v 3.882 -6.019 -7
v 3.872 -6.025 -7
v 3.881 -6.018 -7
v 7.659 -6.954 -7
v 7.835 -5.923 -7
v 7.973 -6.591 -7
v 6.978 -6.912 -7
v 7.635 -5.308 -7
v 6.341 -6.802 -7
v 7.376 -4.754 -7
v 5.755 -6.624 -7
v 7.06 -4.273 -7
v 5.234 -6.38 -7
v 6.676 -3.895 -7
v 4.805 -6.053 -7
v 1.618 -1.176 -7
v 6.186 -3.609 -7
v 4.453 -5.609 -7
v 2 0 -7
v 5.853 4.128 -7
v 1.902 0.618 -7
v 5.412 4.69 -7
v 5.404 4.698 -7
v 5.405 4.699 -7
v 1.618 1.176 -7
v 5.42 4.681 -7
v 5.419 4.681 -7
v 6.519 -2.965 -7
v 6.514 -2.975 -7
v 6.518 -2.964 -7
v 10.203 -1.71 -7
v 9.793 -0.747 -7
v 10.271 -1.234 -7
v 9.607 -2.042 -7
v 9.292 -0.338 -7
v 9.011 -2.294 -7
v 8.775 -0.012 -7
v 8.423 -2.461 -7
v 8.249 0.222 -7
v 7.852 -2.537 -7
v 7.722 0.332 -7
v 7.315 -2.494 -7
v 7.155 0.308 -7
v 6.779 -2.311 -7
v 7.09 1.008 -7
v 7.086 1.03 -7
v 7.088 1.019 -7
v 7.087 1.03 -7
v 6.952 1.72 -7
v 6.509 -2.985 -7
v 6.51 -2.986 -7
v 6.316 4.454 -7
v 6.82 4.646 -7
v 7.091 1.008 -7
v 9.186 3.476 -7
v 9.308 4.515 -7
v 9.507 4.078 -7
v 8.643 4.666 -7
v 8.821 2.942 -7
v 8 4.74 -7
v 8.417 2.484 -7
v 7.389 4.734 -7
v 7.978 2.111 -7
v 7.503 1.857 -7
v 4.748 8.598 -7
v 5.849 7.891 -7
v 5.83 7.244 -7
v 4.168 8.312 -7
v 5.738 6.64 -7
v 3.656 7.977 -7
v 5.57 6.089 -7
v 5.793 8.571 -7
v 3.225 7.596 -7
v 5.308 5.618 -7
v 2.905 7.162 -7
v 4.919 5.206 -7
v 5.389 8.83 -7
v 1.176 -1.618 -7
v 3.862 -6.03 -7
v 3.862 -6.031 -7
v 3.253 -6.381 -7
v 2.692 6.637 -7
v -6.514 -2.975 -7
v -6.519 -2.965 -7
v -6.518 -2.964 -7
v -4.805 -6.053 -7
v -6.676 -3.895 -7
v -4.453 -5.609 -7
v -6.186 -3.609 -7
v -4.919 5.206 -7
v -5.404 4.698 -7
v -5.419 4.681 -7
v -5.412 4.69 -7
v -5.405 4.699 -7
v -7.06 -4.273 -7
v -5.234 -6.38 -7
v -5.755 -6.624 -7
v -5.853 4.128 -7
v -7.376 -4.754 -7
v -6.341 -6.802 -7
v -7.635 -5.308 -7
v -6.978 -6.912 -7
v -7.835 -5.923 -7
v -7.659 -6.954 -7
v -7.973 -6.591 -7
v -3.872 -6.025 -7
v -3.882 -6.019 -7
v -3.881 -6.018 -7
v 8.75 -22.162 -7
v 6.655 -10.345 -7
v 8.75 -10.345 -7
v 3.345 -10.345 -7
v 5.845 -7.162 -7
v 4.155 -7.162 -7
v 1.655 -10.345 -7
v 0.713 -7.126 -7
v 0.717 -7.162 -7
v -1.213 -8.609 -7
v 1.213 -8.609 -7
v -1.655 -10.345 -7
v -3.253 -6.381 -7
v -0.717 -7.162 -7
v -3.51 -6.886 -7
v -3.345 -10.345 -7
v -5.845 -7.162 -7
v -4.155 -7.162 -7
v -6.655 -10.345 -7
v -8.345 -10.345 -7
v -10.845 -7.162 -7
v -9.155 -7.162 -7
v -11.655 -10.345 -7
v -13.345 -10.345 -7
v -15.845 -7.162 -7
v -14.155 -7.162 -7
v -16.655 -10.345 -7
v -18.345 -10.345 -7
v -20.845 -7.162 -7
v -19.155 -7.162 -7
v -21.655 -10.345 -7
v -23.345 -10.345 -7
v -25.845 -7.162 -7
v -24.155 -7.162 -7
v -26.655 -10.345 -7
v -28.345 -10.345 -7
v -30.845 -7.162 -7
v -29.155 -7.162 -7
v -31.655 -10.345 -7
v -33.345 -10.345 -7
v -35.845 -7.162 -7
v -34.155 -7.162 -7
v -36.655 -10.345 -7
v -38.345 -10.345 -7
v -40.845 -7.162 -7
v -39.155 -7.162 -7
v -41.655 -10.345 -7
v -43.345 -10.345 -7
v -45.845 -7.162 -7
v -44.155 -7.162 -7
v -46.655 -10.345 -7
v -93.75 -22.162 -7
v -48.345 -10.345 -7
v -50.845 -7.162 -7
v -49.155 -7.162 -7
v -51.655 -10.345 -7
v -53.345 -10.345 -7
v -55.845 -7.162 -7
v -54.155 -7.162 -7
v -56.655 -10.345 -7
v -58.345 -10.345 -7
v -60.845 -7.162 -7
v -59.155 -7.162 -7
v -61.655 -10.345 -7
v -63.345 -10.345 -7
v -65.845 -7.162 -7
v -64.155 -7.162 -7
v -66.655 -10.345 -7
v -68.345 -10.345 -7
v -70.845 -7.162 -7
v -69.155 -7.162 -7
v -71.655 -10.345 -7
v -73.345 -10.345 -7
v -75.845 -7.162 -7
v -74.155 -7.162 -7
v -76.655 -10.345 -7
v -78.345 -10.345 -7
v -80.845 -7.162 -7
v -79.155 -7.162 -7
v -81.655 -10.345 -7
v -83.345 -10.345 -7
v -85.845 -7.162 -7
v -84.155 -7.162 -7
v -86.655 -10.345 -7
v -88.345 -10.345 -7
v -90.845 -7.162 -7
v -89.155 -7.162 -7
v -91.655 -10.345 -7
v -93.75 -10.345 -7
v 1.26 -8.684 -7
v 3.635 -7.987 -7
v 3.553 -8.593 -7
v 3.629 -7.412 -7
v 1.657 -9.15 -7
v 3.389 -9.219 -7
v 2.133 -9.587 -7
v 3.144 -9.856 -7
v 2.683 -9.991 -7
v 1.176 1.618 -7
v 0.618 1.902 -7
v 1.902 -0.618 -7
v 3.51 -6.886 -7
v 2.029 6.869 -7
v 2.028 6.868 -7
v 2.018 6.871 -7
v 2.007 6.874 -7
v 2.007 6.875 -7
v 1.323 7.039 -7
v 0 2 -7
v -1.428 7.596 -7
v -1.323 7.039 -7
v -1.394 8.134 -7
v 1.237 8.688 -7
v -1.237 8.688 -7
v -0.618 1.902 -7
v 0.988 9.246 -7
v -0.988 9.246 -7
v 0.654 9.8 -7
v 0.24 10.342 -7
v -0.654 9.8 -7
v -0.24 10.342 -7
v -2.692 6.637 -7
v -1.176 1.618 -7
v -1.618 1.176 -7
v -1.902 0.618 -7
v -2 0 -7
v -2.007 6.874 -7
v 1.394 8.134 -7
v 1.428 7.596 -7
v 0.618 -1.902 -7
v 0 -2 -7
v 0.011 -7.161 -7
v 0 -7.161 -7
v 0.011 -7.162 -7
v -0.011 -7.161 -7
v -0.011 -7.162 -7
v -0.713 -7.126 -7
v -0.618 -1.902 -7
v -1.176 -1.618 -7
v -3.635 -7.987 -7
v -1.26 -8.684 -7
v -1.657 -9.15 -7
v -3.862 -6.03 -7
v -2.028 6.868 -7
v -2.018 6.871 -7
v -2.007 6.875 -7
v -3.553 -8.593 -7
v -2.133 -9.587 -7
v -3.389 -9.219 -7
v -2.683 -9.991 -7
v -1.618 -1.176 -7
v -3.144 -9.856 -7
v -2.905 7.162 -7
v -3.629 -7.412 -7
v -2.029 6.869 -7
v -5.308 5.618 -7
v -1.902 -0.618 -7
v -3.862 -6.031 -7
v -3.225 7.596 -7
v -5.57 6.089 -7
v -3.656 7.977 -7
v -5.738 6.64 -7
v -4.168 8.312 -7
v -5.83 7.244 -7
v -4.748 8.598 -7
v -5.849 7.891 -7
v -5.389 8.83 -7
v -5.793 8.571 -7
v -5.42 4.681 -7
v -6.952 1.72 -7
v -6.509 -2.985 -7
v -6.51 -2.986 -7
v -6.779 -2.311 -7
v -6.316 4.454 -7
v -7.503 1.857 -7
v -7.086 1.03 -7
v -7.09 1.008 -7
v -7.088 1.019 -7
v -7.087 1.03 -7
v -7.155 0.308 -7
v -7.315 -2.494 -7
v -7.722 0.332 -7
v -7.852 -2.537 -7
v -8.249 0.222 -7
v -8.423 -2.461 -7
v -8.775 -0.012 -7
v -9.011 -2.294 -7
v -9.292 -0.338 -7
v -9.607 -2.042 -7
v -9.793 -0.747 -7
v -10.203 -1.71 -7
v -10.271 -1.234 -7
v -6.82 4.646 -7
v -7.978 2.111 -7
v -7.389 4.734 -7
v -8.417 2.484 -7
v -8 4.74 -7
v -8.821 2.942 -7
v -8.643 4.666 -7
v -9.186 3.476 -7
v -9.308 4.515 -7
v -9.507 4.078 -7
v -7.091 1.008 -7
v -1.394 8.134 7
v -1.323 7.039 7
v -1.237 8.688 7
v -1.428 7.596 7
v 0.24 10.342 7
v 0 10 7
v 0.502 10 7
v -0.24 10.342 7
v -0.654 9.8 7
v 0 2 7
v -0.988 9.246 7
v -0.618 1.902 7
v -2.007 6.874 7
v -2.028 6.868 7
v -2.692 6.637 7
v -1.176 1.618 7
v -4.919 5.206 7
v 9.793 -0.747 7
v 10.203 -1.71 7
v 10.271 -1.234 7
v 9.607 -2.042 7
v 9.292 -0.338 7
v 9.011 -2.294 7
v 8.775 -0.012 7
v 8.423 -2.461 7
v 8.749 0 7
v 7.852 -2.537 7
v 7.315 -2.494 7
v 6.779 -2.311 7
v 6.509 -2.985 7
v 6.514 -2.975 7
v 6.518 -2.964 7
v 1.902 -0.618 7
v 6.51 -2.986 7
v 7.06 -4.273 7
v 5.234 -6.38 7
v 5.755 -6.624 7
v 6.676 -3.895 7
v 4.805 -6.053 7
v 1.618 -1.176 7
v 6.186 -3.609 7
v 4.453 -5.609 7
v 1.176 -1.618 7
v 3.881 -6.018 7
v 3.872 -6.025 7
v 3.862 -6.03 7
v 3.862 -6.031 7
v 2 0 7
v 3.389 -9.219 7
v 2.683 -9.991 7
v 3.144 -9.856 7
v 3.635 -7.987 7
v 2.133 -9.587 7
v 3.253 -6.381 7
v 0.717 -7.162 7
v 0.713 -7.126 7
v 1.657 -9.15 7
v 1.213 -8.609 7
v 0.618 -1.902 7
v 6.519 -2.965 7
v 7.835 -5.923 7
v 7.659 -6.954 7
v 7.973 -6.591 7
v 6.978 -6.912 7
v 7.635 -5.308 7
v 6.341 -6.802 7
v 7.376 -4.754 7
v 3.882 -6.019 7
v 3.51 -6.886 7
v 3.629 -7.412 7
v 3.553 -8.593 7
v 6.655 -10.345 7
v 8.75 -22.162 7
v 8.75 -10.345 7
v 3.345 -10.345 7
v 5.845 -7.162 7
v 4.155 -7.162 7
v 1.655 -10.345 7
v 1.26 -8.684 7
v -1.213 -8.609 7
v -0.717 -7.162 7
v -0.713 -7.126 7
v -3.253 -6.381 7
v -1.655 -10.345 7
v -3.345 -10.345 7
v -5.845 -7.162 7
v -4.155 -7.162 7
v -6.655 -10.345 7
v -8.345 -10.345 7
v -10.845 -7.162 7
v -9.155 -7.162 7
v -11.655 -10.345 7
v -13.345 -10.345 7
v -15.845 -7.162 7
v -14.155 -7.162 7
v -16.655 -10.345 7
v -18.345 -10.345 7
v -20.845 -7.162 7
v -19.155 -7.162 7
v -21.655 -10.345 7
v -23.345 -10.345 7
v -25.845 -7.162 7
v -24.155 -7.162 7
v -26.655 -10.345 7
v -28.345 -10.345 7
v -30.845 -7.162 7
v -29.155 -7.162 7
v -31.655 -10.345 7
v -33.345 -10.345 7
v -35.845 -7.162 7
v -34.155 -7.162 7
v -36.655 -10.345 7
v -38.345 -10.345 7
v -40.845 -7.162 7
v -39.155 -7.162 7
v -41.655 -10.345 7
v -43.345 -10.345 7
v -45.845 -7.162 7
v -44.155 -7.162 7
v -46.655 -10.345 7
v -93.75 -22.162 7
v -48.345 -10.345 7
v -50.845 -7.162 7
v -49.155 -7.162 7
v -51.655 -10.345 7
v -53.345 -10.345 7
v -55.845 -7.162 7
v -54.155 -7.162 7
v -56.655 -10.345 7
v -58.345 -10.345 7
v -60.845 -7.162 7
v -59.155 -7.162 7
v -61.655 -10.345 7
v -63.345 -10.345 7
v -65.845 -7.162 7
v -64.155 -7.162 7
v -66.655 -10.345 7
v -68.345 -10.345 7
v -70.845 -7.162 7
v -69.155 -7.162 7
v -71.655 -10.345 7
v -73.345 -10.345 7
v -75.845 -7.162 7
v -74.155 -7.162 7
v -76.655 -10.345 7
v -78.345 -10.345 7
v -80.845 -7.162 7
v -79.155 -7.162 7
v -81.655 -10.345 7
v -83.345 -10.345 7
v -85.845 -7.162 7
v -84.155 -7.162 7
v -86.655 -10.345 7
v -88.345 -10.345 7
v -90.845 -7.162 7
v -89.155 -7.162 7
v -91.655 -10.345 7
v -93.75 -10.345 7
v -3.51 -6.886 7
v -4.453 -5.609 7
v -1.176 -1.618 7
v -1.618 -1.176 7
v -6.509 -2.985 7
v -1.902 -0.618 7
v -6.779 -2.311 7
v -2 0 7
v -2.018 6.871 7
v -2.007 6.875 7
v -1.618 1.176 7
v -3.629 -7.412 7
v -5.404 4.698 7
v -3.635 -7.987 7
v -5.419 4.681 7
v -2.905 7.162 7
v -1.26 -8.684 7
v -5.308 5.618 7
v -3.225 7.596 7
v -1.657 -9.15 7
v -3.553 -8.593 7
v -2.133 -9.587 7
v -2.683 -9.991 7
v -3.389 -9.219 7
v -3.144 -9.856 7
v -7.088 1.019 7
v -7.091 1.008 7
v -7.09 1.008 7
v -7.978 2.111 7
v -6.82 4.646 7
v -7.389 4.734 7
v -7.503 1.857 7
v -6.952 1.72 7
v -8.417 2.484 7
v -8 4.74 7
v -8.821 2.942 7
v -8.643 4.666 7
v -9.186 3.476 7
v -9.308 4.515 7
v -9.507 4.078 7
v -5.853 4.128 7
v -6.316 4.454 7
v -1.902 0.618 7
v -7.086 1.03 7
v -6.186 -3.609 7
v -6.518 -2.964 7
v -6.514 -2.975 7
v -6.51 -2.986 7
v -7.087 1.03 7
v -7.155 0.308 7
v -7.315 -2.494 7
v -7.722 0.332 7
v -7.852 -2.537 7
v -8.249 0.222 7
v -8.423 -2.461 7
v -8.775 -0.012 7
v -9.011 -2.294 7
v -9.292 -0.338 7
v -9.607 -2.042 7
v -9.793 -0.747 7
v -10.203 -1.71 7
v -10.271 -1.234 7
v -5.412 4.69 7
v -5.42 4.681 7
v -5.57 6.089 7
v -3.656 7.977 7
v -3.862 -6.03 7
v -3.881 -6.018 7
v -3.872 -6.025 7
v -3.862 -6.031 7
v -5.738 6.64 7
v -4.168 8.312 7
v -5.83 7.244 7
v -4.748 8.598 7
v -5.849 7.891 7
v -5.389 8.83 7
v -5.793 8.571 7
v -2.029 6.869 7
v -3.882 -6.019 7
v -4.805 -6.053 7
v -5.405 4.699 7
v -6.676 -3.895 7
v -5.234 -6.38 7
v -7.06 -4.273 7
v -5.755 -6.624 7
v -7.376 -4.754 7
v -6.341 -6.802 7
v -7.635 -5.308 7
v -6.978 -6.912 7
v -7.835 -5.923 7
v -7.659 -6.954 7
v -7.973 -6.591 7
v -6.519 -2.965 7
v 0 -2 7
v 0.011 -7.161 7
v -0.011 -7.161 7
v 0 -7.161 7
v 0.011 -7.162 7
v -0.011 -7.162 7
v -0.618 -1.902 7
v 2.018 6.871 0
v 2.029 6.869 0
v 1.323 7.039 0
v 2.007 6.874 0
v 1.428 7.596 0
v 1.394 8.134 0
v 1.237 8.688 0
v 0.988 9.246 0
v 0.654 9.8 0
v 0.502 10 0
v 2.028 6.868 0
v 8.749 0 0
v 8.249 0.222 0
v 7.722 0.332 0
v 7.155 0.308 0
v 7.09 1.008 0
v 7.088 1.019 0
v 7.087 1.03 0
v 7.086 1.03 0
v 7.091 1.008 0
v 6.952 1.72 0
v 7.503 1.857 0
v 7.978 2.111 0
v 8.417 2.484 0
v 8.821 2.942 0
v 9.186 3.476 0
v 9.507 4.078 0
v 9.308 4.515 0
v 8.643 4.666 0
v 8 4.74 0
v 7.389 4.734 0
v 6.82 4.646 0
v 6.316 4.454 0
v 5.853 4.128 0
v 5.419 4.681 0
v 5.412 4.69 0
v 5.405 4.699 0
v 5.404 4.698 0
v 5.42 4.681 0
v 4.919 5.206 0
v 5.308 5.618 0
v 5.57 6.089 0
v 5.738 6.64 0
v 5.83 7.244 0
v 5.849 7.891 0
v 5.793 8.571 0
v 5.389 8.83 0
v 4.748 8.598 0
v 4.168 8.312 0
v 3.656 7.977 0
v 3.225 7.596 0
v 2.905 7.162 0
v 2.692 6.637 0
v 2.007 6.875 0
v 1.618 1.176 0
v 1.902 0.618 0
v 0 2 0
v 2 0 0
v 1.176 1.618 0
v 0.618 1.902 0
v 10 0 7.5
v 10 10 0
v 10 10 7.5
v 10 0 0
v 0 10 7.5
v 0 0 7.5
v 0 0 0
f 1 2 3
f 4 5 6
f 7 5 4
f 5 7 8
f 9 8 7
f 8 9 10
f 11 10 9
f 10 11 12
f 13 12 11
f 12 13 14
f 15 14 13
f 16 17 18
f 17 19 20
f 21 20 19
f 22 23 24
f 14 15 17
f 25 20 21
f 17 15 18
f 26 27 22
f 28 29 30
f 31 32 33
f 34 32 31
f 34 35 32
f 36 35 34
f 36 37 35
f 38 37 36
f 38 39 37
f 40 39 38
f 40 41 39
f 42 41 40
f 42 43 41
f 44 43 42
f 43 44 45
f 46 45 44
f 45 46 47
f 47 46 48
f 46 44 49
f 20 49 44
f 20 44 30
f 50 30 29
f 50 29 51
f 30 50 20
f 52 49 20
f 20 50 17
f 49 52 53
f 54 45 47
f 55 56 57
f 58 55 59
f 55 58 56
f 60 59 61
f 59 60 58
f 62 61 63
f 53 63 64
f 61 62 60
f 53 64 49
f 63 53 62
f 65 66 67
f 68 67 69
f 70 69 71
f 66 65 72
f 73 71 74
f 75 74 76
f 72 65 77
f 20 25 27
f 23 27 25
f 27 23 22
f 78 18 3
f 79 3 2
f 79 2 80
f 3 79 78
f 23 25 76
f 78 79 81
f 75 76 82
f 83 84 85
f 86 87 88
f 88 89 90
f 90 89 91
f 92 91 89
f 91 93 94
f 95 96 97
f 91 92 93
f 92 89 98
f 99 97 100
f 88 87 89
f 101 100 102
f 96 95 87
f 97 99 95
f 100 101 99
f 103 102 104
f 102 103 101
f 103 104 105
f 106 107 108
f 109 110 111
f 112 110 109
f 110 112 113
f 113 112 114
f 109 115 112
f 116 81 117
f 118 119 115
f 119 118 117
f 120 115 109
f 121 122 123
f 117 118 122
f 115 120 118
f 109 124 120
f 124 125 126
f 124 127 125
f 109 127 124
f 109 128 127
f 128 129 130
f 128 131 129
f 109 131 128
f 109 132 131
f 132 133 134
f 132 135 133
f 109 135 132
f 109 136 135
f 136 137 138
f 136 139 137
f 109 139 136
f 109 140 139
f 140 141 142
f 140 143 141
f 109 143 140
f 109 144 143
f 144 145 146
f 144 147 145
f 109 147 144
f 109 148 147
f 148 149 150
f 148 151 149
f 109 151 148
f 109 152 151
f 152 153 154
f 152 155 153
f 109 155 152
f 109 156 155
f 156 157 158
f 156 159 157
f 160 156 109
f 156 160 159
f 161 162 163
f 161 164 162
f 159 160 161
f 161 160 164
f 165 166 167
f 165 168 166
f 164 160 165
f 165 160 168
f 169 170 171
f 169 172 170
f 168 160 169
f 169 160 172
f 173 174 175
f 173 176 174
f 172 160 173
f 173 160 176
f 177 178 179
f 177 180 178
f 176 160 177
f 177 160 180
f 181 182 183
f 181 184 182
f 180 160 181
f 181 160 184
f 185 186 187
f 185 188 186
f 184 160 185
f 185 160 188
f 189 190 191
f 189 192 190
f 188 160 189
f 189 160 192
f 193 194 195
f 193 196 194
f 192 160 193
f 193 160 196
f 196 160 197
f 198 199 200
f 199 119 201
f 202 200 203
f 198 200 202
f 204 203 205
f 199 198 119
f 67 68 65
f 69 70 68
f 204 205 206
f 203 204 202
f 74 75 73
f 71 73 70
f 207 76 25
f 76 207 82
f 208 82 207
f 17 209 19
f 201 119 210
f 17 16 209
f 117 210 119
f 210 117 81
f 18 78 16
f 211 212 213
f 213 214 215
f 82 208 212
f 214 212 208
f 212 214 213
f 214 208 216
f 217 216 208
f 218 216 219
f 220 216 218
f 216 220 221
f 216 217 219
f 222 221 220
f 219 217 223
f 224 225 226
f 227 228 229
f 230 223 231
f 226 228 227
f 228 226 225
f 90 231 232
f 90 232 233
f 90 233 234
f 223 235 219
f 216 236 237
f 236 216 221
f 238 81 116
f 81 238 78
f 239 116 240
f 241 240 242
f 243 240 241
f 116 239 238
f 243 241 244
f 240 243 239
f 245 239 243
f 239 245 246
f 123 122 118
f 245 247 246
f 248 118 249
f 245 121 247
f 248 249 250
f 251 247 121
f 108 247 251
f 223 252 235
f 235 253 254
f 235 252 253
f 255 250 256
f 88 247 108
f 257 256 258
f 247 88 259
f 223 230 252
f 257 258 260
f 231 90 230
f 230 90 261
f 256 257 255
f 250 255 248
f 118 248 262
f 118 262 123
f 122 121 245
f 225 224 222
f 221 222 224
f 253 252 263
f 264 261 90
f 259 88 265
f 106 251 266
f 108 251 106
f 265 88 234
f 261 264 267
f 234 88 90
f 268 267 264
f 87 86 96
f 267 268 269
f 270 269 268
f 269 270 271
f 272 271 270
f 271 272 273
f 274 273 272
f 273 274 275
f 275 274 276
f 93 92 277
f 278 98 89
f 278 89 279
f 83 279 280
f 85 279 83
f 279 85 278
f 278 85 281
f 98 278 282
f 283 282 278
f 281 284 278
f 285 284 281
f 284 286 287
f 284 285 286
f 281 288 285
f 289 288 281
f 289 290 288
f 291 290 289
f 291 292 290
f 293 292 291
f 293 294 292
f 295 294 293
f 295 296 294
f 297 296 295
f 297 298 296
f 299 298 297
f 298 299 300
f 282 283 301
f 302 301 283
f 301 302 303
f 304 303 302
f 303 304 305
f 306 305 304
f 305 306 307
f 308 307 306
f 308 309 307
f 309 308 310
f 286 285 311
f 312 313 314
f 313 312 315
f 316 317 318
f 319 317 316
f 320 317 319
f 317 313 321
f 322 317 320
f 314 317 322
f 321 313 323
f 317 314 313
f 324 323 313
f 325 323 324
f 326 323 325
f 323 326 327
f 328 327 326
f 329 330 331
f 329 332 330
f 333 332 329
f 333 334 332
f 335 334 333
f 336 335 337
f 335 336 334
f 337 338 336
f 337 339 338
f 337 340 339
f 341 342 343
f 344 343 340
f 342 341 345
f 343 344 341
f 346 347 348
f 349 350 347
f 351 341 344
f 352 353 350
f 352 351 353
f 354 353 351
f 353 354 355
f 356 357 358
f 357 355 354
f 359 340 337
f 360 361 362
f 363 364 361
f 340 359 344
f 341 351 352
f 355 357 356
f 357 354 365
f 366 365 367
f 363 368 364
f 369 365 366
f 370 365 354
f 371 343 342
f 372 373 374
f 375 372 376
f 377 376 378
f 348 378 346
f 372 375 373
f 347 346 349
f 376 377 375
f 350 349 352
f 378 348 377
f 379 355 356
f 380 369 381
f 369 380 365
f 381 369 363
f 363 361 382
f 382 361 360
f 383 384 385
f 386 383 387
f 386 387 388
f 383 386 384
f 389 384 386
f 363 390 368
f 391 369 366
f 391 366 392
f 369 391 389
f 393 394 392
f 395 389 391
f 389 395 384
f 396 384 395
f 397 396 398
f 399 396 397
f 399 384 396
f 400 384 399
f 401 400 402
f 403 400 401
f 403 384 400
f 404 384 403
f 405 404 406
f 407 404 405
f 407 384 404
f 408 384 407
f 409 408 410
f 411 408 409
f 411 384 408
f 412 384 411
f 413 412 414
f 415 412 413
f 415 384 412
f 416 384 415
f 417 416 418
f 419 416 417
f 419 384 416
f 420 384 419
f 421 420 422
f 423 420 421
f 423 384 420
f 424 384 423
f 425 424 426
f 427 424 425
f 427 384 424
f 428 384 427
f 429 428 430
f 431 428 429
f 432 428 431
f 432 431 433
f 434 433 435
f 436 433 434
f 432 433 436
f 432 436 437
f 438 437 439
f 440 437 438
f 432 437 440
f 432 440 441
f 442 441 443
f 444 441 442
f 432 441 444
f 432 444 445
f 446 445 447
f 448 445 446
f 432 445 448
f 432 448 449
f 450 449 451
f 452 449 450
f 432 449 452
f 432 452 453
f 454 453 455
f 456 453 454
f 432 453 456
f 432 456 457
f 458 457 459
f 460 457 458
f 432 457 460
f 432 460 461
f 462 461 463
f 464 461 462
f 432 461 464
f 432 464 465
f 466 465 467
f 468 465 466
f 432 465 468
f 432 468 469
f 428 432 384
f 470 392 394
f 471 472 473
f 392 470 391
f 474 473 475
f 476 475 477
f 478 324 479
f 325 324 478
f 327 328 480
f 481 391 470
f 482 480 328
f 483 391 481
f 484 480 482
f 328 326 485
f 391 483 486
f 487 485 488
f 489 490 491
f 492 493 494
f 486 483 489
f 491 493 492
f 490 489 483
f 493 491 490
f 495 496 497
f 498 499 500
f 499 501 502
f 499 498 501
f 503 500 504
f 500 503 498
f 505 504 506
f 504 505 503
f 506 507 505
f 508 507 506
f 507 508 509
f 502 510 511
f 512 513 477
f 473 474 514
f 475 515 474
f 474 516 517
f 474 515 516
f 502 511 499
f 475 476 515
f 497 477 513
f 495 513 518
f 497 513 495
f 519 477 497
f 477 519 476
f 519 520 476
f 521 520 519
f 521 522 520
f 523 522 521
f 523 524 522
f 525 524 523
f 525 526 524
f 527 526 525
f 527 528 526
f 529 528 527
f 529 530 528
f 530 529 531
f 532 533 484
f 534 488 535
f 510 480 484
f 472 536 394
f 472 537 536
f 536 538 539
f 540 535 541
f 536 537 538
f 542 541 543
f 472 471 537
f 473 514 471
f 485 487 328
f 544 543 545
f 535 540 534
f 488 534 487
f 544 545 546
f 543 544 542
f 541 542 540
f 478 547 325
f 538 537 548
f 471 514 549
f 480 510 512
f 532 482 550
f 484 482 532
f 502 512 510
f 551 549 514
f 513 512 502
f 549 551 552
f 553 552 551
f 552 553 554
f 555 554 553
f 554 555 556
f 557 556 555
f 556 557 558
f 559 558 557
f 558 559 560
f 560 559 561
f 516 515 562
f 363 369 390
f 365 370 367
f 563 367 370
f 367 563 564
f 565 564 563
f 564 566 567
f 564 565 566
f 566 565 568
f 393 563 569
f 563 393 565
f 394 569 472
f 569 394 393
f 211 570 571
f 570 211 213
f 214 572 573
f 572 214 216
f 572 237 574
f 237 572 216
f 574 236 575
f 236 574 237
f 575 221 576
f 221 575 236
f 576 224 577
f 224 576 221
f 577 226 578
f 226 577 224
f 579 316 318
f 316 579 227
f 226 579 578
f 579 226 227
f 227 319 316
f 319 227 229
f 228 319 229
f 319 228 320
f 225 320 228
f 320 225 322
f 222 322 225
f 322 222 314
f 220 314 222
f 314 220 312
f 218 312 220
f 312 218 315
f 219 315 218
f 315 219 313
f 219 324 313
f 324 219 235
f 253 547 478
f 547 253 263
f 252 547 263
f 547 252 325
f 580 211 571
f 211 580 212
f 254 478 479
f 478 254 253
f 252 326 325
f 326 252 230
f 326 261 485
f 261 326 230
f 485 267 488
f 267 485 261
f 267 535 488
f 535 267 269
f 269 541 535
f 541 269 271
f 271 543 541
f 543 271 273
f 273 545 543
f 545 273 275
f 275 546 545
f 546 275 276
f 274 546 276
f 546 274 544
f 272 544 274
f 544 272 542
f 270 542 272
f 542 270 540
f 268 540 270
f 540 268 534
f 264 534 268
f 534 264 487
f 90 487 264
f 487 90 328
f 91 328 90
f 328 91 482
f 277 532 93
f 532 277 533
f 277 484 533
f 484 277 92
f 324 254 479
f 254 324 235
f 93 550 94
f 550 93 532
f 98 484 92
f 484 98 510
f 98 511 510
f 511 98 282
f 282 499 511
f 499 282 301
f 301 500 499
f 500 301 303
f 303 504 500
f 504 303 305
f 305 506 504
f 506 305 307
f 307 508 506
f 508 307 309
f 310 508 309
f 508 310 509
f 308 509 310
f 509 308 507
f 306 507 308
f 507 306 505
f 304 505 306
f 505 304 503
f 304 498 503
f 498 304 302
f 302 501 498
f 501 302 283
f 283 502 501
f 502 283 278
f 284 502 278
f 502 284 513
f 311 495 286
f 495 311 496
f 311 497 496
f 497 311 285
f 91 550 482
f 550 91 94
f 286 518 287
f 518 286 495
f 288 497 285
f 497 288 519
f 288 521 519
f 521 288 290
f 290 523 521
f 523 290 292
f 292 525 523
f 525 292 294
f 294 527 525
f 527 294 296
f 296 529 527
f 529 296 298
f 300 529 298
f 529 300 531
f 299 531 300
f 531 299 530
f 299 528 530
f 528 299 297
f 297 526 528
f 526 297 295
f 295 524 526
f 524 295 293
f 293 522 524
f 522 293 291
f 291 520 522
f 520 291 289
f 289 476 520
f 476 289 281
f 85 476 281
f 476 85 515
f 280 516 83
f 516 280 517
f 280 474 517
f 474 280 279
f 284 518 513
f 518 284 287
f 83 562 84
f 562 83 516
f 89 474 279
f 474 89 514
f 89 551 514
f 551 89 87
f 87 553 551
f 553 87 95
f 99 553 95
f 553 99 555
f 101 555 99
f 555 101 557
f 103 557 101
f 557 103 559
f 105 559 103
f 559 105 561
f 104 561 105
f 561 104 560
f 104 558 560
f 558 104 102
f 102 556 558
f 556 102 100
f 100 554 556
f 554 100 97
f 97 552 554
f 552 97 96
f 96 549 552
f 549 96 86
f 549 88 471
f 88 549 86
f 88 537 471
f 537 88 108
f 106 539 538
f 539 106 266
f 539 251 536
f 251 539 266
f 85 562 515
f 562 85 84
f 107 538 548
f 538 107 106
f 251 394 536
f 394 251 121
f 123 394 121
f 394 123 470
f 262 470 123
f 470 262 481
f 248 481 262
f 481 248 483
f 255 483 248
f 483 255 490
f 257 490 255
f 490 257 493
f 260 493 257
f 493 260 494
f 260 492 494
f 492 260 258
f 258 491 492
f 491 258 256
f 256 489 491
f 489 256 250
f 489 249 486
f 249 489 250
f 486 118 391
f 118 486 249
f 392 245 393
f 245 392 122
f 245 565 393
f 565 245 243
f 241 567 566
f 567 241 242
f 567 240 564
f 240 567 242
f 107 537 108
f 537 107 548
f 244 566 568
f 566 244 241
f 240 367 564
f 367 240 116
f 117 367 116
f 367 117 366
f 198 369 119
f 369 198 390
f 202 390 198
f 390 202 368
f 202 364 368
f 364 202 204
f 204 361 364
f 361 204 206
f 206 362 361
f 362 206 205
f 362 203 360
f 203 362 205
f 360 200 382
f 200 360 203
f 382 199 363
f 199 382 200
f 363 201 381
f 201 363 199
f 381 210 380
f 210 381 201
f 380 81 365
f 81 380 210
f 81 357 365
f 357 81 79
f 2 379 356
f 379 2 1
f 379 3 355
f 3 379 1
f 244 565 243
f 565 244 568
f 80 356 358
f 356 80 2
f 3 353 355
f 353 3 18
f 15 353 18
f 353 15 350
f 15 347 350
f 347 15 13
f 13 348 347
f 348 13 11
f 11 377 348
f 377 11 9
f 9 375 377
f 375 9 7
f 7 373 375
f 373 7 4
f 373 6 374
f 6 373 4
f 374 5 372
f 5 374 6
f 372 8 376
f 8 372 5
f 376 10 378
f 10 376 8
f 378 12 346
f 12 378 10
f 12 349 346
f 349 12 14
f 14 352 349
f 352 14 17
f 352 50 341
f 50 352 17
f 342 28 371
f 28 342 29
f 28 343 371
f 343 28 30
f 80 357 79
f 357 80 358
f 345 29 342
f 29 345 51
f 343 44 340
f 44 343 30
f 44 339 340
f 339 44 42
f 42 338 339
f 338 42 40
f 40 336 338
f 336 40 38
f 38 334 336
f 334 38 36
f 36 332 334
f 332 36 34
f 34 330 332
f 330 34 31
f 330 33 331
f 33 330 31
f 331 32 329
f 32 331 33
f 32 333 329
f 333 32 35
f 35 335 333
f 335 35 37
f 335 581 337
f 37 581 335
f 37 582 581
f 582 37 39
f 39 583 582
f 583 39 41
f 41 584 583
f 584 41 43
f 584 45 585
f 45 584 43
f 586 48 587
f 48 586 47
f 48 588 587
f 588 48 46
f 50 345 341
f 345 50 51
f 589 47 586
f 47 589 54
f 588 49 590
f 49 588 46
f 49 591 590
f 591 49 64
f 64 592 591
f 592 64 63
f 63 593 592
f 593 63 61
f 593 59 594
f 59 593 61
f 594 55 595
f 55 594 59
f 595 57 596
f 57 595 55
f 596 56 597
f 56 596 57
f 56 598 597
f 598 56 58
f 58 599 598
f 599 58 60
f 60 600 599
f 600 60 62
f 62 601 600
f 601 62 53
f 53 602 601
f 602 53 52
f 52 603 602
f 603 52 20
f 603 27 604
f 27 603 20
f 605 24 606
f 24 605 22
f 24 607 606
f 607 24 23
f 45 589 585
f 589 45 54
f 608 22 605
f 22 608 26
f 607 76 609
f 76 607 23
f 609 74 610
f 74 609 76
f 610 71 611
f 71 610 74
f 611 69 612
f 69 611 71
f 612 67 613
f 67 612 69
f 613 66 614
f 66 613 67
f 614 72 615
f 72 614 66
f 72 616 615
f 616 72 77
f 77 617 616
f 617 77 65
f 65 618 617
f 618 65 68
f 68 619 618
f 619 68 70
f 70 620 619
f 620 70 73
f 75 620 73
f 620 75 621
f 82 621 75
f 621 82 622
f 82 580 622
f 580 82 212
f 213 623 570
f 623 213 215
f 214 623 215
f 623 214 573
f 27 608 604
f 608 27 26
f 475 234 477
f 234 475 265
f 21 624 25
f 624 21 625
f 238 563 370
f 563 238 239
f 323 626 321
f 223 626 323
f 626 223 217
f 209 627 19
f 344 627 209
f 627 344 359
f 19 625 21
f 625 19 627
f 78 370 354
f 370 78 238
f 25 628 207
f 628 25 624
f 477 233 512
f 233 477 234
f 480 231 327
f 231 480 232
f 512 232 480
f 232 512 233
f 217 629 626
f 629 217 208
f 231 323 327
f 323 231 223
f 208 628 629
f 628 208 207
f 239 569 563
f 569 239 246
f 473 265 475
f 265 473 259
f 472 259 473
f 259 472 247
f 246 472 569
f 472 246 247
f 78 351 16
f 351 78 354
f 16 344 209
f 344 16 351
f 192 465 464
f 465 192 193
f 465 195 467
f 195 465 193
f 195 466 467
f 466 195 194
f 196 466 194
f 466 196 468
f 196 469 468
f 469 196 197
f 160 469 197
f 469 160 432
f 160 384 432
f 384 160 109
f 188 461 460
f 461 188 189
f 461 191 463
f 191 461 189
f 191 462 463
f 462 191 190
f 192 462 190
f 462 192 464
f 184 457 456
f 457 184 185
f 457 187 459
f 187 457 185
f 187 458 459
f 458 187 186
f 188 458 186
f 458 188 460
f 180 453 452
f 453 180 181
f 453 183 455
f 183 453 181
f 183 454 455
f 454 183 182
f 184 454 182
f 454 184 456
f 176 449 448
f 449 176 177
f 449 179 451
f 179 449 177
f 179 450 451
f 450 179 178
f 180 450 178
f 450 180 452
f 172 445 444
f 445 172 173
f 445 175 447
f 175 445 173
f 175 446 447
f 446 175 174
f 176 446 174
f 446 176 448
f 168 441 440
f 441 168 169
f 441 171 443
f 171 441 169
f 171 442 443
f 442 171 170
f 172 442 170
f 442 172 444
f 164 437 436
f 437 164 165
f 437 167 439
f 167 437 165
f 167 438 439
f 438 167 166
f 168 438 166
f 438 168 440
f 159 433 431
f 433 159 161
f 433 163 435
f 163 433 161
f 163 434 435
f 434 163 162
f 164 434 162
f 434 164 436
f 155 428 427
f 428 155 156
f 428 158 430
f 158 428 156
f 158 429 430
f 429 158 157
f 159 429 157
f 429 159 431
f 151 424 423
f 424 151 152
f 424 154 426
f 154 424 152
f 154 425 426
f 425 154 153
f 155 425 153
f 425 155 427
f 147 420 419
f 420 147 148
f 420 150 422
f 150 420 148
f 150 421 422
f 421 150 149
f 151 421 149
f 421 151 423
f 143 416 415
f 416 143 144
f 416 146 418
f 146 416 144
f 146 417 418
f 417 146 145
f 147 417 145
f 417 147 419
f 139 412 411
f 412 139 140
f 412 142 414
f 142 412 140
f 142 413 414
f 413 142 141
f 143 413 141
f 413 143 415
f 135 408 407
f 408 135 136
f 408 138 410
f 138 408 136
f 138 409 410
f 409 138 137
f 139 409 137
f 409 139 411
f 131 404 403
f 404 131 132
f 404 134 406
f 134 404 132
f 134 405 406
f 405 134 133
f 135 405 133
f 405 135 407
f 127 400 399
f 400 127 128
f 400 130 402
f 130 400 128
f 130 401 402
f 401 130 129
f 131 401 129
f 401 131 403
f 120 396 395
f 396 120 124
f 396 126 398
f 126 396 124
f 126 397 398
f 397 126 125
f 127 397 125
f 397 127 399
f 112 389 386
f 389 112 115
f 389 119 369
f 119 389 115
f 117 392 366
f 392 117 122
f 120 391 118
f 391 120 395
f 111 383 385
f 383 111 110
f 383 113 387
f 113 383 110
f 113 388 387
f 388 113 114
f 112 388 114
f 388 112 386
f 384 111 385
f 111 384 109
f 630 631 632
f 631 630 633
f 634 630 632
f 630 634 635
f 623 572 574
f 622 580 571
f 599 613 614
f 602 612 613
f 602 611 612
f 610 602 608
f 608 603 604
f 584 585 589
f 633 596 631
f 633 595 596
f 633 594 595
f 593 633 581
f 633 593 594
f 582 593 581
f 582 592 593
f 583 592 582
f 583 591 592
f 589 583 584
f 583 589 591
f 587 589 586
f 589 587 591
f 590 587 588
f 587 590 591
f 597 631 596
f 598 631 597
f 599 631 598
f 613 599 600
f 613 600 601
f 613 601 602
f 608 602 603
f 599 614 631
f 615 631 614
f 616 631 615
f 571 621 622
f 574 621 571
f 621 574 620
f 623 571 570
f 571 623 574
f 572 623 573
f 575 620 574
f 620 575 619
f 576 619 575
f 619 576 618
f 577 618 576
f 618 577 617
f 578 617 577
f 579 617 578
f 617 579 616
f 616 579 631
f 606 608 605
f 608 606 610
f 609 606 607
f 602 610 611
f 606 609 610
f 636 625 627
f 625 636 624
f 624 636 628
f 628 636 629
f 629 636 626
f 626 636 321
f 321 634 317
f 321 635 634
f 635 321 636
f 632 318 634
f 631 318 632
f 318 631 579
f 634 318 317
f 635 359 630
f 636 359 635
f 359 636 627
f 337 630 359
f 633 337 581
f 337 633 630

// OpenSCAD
//////////////////////////////////////////////////////////////////////////////////////////////
// Public Domain Parametric Involute Spur Gear (and involute helical gear and involute rack)
// version 1.1
// by Leemon Baird, 2011, Leemon@Leemon.com
//http://www.thingiverse.com/thing:5505
//
// This file is public domain.  Use it for any purpose, including commercial
// applications.  Attribution would be nice, but is not required.  There is
// no warranty of any kind, including its correctness, usefulness, or safety.
// 
// This is parameterized involute spur (or helical) gear.  It is much simpler and less powerful than
// others on Thingiverse.  But it is public domain.  I implemented it from scratch from the 
// descriptions and equations on Wikipedia and the web, using Mathematica for calculations and testing,
// and I now release it into the public domain.
//
//		http://en.wikipedia.org/wiki/Involute_gear
//		http://en.wikipedia.org/wiki/Gear
//		http://en.wikipedia.org/wiki/List_of_gear_nomenclature
//		http://gtrebaol.free.fr/doc/catia/spur_gear.html
//		http://www.cs.cmu.edu/~rapidproto/mechanisms/chpt7.html
//
// The module gear() gives an involute spur gear, with reasonable defaults for all the parameters.
// Normally, you should just choose the first 4 parameters, and let the rest be default values.
// The module gear() gives a gear in the XY plane, centered on the origin, with one tooth centered on
// the positive Y axis.  The various functions below it take the same parameters, and return various
// measurements for the gear.  The most important is pitch_radius, which tells how far apart to space
// gears that are meshing, and adendum_radius, which gives the size of the region filled by the gear.
// A gear has a "pitch circle", which is an invisible circle that cuts through the middle of each
// tooth (though not the exact center). In order for two gears to mesh, their pitch circles should 
// just touch.  So the distance between their centers should be pitch_radius() for one, plus pitch_radius() 
// for the other, which gives the radii of their pitch circles.
//
// In order for two gears to mesh, they must have the same mm_per_tooth and pressure_angle parameters.  
// mm_per_tooth gives the number of millimeters of arc around the pitch circle covered by one tooth and one
// space between teeth.  The pitch angle controls how flat or bulged the sides of the teeth are.  Common
// values include 14.5 degrees and 20 degrees, and occasionally 25.  Though I've seen 28 recommended for
// plastic gears. Larger numbers bulge out more, giving stronger teeth, so 28 degrees is the default here.
//
// The ratio of number_of_teeth for two meshing gears gives how many times one will make a full 
// revolution when the the other makes one full revolution.  If the two numbers are coprime (i.e. 
// are not both divisible by the same number greater than 1), then every tooth on one gear
// will meet every tooth on the other, for more even wear.  So coprime numbers of teeth are good.
//
// The module rack() gives a rack, which is a bar with teeth.  A rack can mesh with any
// gear that has the same mm_per_tooth and pressure_angle.
//
// Some terminology: 
// The outline of a gear is a smooth circle (the "pitch circle") which has mountains and valleys
// added so it is toothed.  So there is an inner circle (the "root circle") that touches the 
// base of all the teeth, an outer circle that touches the tips of all the teeth,
// and the invisible pitch circle in between them.  There is also a "base circle", which can be smaller than
// all three of the others, which controls the shape of the teeth.  The side of each tooth lies on the path 
// that the end of a string would follow if it were wrapped tightly around the base circle, then slowly unwound.  
// That shape is an "involute", which gives this type of gear its name.
//
//////////////////////////////////////////////////////////////////////////////////////////////

//An involute spur gear, with reasonable defaults for all the parameters.
//Normally, you should just choose the first 4 parameters, and let the rest be default values.
//Meshing gears must match in mm_per_tooth, pressure_angle, and twist,
//and be separated by the sum of their pitch radii, which can be found with pitch_radius().
module gear (
	mm_per_tooth    = 3,    //this is the "circular pitch", the circumference of the pitch circle divided by the number of teeth
	number_of_teeth = 11,   //total number of teeth around the entire perimeter
	thickness       = 6,    //thickness of gear in mm
	hole_diameter   = 3,    //diameter of the hole in the center, in mm
	twist           = 0,    //teeth rotate this many degrees from bottom of gear to top.  360 makes the gear a screw with each thread going around once
	teeth_to_hide   = 0,    //number of teeth to delete to make this only a fraction of a circle
	pressure_angle  = 28,   //Controls how straight or bulged the tooth sides are. In degrees.
	clearance       = 0.0,  //gap between top of a tooth on one gear and bottom of valley on a meshing gear (in millimeters)
	backlash        = 0.0   //gap between two meshing teeth, in the direction along the circumference of the pitch circle
) {
	assign(pi = 3.1415926)
	assign(p  = mm_per_tooth * number_of_teeth / pi / 2)  //radius of pitch circle
	assign(c  = p + mm_per_tooth / pi - clearance)        //radius of outer circle
	assign(b  = p*cos(pressure_angle))                    //radius of base circle
	assign(r  = p-(c-p)-clearance)                        //radius of root circle
	assign(t  = mm_per_tooth/2-backlash/2)                //tooth thickness at pitch circle
	assign(k  = -iang(b, p) - t/2/p/pi*180) {             //angle to where involute meets base circle on each side of tooth
		difference() {
			for (i = [0:number_of_teeth-teeth_to_hide-1] )
				rotate([0,0,i*360/number_of_teeth])
					linear_extrude(height = thickness, center = true, convexity = 10, twist = twist)
						polygon(
							points=[
								[0, -hole_diameter/10],
								polar(r, -181/number_of_teeth),
								polar(r, r<b ? k : -180/number_of_teeth),
								q7(0/5,r,b,c,k, 1),q7(1/5,r,b,c,k, 1),q7(2/5,r,b,c,k, 1),q7(3/5,r,b,c,k, 1),q7(4/5,r,b,c,k, 1),q7(5/5,r,b,c,k, 1),
								q7(5/5,r,b,c,k,-1),q7(4/5,r,b,c,k,-1),q7(3/5,r,b,c,k,-1),q7(2/5,r,b,c,k,-1),q7(1/5,r,b,c,k,-1),q7(0/5,r,b,c,k,-1),
								polar(r, r<b ? -k : 180/number_of_teeth),
								polar(r, 181/number_of_teeth)
							],
 							paths=[[0,1,2,3,4,5,6,7,8,9,10,11,12,13,14,15,16]]
						);
			cylinder(h=2*thickness+1, r=hole_diameter/2, center=true, $fn=20);
		}
	}
};	
//these 4 functions are used by gear
function polar(r,theta)   = r*[sin(theta), cos(theta)];                            //convert polar to cartesian coordinates
function iang(r1,r2)      = sqrt((r2/r1)*(r2/r1) - 1)/3.1415926*180 - acos(r1/r2); //unwind a string this many degrees to go from radius r1 to radius r2
function q7(f,r,b,r2,t,s) = q6(b,s,t,(1-f)*max(b,r)+f*r2);                         //radius a fraction f up the curved side of the tooth 
function q6(b,s,t,d)      = polar(d,s*(iang(b,d)+t));                              //point at radius d on the involute curve

//a rack, which is a straight line with teeth (the same as a segment from a giant gear with a huge number of teeth).
//The "pitch circle" is a line along the X axis.
module rack (
	mm_per_tooth    = 3,    //this is the "circular pitch", the circumference of the pitch circle divided by the number of teeth
	number_of_teeth = 11,   //total number of teeth along the rack
	thickness       = 6,    //thickness of rack in mm (affects each tooth)
	height          = 120,   //height of rack in mm, from tooth top to far side of rack.
	pressure_angle  = 28,   //Controls how straight or bulged the tooth sides are. In degrees.
	backlash        = 0.0   //gap between two meshing teeth, in the direction along the circumference of the pitch circle
) {
	assign(pi = 3.1415926)
	assign(a = mm_per_tooth / pi) //addendum
	assign(t = a*cos(pressure_angle)-1)         //tooth side is tilted so top/bottom corners move this amount
		for (i = [0:number_of_teeth-1] )
			translate([i*mm_per_tooth,0,0])
				linear_extrude(height = thickness, center = true, convexity = 10)
					polygon(
						points=[
							[-mm_per_tooth * 3/4,                 a-height],
							[-mm_per_tooth * 3/4 - backlash,     -a],
							[-mm_per_tooth * 1/4 + backlash - t, -a],
							[-mm_per_tooth * 1/4 + backlash + t,  a],
							[ mm_per_tooth * 1/4 - backlash - t,  a],
							[ mm_per_tooth * 1/4 - backlash + t, -a],
							[ mm_per_tooth * 3/4 + backlash,     -a],
							[ mm_per_tooth * 3/4,                 a-height],
						],
						paths=[[0,1,2,3,4,5,6,7]]
					);
};	

//These 5 functions let the user find the derived dimensions of the gear.
//A gear fits within a circle of radius outer_radius, and two gears should have
//their centers separated by the sum of their pictch_radius.
function circular_pitch  (mm_per_tooth=3) = mm_per_tooth;                     //tooth density expressed as "circular pitch" in millimeters
function diametral_pitch (mm_per_tooth=3) = 3.1415926 / mm_per_tooth;         //tooth density expressed as "diametral pitch" in teeth per millimeter
function module_value    (mm_per_tooth=3) = mm_per_tooth / pi;                //tooth density expressed as "module" or "modulus" in millimeters
function pitch_radius    (mm_per_tooth=3,number_of_teeth=11) = mm_per_tooth * number_of_teeth / 3.1415926 / 2;
function outer_radius    (mm_per_tooth=3,number_of_teeth=11,clearance=0.1)    //The gear fits entirely within a cylinder of this radius.
	= mm_per_tooth*(1+number_of_teeth/2)/3.1415926  - clearance;              

//////////////////////////////////////////////////////////////////////////////////////////////
//example gear train.  
//Try it with OpenSCAD View/Animate command with 20 steps and 24 FPS.
//The gears will continue to be rotated to mesh correctly if you change the number of teeth.

n1 = 11; //red gear number of teeth
n2 = 20; //green gear
n3 = 5;  //blue gear
n4 = 20; //orange gear
n5 = 20;  //gray rack
mm_per_tooth = 5; //all meshing gears need the same mm_per_tooth (and the same pressure_angle)
thickness    = 14;
hole         = 4;
height       = 15;

d1 =pitch_radius(mm_per_tooth,n1);
d12=pitch_radius(mm_per_tooth,n1) + pitch_radius(mm_per_tooth,n2);
d13=pitch_radius(mm_per_tooth,n1) + pitch_radius(mm_per_tooth,n3);
d14=pitch_radius(mm_per_tooth,n1) + pitch_radius(mm_per_tooth,n4);

translate([0,0,0]) rotate([0,0, $t*360/n1])color([1.00,0.75,0.75])
gear(mm_per_tooth,n1,thickness,hole);

translate([(-floor(n5/2)-floor(n1/2)+$t+n1/2-1/2)*9, -d1+0.0, 0]) rotate([0,0,0]) color([0.75,0.75,0.75]) rack(mm_per_tooth,n5,thickness,height);

cube([10,10,7.5]);
